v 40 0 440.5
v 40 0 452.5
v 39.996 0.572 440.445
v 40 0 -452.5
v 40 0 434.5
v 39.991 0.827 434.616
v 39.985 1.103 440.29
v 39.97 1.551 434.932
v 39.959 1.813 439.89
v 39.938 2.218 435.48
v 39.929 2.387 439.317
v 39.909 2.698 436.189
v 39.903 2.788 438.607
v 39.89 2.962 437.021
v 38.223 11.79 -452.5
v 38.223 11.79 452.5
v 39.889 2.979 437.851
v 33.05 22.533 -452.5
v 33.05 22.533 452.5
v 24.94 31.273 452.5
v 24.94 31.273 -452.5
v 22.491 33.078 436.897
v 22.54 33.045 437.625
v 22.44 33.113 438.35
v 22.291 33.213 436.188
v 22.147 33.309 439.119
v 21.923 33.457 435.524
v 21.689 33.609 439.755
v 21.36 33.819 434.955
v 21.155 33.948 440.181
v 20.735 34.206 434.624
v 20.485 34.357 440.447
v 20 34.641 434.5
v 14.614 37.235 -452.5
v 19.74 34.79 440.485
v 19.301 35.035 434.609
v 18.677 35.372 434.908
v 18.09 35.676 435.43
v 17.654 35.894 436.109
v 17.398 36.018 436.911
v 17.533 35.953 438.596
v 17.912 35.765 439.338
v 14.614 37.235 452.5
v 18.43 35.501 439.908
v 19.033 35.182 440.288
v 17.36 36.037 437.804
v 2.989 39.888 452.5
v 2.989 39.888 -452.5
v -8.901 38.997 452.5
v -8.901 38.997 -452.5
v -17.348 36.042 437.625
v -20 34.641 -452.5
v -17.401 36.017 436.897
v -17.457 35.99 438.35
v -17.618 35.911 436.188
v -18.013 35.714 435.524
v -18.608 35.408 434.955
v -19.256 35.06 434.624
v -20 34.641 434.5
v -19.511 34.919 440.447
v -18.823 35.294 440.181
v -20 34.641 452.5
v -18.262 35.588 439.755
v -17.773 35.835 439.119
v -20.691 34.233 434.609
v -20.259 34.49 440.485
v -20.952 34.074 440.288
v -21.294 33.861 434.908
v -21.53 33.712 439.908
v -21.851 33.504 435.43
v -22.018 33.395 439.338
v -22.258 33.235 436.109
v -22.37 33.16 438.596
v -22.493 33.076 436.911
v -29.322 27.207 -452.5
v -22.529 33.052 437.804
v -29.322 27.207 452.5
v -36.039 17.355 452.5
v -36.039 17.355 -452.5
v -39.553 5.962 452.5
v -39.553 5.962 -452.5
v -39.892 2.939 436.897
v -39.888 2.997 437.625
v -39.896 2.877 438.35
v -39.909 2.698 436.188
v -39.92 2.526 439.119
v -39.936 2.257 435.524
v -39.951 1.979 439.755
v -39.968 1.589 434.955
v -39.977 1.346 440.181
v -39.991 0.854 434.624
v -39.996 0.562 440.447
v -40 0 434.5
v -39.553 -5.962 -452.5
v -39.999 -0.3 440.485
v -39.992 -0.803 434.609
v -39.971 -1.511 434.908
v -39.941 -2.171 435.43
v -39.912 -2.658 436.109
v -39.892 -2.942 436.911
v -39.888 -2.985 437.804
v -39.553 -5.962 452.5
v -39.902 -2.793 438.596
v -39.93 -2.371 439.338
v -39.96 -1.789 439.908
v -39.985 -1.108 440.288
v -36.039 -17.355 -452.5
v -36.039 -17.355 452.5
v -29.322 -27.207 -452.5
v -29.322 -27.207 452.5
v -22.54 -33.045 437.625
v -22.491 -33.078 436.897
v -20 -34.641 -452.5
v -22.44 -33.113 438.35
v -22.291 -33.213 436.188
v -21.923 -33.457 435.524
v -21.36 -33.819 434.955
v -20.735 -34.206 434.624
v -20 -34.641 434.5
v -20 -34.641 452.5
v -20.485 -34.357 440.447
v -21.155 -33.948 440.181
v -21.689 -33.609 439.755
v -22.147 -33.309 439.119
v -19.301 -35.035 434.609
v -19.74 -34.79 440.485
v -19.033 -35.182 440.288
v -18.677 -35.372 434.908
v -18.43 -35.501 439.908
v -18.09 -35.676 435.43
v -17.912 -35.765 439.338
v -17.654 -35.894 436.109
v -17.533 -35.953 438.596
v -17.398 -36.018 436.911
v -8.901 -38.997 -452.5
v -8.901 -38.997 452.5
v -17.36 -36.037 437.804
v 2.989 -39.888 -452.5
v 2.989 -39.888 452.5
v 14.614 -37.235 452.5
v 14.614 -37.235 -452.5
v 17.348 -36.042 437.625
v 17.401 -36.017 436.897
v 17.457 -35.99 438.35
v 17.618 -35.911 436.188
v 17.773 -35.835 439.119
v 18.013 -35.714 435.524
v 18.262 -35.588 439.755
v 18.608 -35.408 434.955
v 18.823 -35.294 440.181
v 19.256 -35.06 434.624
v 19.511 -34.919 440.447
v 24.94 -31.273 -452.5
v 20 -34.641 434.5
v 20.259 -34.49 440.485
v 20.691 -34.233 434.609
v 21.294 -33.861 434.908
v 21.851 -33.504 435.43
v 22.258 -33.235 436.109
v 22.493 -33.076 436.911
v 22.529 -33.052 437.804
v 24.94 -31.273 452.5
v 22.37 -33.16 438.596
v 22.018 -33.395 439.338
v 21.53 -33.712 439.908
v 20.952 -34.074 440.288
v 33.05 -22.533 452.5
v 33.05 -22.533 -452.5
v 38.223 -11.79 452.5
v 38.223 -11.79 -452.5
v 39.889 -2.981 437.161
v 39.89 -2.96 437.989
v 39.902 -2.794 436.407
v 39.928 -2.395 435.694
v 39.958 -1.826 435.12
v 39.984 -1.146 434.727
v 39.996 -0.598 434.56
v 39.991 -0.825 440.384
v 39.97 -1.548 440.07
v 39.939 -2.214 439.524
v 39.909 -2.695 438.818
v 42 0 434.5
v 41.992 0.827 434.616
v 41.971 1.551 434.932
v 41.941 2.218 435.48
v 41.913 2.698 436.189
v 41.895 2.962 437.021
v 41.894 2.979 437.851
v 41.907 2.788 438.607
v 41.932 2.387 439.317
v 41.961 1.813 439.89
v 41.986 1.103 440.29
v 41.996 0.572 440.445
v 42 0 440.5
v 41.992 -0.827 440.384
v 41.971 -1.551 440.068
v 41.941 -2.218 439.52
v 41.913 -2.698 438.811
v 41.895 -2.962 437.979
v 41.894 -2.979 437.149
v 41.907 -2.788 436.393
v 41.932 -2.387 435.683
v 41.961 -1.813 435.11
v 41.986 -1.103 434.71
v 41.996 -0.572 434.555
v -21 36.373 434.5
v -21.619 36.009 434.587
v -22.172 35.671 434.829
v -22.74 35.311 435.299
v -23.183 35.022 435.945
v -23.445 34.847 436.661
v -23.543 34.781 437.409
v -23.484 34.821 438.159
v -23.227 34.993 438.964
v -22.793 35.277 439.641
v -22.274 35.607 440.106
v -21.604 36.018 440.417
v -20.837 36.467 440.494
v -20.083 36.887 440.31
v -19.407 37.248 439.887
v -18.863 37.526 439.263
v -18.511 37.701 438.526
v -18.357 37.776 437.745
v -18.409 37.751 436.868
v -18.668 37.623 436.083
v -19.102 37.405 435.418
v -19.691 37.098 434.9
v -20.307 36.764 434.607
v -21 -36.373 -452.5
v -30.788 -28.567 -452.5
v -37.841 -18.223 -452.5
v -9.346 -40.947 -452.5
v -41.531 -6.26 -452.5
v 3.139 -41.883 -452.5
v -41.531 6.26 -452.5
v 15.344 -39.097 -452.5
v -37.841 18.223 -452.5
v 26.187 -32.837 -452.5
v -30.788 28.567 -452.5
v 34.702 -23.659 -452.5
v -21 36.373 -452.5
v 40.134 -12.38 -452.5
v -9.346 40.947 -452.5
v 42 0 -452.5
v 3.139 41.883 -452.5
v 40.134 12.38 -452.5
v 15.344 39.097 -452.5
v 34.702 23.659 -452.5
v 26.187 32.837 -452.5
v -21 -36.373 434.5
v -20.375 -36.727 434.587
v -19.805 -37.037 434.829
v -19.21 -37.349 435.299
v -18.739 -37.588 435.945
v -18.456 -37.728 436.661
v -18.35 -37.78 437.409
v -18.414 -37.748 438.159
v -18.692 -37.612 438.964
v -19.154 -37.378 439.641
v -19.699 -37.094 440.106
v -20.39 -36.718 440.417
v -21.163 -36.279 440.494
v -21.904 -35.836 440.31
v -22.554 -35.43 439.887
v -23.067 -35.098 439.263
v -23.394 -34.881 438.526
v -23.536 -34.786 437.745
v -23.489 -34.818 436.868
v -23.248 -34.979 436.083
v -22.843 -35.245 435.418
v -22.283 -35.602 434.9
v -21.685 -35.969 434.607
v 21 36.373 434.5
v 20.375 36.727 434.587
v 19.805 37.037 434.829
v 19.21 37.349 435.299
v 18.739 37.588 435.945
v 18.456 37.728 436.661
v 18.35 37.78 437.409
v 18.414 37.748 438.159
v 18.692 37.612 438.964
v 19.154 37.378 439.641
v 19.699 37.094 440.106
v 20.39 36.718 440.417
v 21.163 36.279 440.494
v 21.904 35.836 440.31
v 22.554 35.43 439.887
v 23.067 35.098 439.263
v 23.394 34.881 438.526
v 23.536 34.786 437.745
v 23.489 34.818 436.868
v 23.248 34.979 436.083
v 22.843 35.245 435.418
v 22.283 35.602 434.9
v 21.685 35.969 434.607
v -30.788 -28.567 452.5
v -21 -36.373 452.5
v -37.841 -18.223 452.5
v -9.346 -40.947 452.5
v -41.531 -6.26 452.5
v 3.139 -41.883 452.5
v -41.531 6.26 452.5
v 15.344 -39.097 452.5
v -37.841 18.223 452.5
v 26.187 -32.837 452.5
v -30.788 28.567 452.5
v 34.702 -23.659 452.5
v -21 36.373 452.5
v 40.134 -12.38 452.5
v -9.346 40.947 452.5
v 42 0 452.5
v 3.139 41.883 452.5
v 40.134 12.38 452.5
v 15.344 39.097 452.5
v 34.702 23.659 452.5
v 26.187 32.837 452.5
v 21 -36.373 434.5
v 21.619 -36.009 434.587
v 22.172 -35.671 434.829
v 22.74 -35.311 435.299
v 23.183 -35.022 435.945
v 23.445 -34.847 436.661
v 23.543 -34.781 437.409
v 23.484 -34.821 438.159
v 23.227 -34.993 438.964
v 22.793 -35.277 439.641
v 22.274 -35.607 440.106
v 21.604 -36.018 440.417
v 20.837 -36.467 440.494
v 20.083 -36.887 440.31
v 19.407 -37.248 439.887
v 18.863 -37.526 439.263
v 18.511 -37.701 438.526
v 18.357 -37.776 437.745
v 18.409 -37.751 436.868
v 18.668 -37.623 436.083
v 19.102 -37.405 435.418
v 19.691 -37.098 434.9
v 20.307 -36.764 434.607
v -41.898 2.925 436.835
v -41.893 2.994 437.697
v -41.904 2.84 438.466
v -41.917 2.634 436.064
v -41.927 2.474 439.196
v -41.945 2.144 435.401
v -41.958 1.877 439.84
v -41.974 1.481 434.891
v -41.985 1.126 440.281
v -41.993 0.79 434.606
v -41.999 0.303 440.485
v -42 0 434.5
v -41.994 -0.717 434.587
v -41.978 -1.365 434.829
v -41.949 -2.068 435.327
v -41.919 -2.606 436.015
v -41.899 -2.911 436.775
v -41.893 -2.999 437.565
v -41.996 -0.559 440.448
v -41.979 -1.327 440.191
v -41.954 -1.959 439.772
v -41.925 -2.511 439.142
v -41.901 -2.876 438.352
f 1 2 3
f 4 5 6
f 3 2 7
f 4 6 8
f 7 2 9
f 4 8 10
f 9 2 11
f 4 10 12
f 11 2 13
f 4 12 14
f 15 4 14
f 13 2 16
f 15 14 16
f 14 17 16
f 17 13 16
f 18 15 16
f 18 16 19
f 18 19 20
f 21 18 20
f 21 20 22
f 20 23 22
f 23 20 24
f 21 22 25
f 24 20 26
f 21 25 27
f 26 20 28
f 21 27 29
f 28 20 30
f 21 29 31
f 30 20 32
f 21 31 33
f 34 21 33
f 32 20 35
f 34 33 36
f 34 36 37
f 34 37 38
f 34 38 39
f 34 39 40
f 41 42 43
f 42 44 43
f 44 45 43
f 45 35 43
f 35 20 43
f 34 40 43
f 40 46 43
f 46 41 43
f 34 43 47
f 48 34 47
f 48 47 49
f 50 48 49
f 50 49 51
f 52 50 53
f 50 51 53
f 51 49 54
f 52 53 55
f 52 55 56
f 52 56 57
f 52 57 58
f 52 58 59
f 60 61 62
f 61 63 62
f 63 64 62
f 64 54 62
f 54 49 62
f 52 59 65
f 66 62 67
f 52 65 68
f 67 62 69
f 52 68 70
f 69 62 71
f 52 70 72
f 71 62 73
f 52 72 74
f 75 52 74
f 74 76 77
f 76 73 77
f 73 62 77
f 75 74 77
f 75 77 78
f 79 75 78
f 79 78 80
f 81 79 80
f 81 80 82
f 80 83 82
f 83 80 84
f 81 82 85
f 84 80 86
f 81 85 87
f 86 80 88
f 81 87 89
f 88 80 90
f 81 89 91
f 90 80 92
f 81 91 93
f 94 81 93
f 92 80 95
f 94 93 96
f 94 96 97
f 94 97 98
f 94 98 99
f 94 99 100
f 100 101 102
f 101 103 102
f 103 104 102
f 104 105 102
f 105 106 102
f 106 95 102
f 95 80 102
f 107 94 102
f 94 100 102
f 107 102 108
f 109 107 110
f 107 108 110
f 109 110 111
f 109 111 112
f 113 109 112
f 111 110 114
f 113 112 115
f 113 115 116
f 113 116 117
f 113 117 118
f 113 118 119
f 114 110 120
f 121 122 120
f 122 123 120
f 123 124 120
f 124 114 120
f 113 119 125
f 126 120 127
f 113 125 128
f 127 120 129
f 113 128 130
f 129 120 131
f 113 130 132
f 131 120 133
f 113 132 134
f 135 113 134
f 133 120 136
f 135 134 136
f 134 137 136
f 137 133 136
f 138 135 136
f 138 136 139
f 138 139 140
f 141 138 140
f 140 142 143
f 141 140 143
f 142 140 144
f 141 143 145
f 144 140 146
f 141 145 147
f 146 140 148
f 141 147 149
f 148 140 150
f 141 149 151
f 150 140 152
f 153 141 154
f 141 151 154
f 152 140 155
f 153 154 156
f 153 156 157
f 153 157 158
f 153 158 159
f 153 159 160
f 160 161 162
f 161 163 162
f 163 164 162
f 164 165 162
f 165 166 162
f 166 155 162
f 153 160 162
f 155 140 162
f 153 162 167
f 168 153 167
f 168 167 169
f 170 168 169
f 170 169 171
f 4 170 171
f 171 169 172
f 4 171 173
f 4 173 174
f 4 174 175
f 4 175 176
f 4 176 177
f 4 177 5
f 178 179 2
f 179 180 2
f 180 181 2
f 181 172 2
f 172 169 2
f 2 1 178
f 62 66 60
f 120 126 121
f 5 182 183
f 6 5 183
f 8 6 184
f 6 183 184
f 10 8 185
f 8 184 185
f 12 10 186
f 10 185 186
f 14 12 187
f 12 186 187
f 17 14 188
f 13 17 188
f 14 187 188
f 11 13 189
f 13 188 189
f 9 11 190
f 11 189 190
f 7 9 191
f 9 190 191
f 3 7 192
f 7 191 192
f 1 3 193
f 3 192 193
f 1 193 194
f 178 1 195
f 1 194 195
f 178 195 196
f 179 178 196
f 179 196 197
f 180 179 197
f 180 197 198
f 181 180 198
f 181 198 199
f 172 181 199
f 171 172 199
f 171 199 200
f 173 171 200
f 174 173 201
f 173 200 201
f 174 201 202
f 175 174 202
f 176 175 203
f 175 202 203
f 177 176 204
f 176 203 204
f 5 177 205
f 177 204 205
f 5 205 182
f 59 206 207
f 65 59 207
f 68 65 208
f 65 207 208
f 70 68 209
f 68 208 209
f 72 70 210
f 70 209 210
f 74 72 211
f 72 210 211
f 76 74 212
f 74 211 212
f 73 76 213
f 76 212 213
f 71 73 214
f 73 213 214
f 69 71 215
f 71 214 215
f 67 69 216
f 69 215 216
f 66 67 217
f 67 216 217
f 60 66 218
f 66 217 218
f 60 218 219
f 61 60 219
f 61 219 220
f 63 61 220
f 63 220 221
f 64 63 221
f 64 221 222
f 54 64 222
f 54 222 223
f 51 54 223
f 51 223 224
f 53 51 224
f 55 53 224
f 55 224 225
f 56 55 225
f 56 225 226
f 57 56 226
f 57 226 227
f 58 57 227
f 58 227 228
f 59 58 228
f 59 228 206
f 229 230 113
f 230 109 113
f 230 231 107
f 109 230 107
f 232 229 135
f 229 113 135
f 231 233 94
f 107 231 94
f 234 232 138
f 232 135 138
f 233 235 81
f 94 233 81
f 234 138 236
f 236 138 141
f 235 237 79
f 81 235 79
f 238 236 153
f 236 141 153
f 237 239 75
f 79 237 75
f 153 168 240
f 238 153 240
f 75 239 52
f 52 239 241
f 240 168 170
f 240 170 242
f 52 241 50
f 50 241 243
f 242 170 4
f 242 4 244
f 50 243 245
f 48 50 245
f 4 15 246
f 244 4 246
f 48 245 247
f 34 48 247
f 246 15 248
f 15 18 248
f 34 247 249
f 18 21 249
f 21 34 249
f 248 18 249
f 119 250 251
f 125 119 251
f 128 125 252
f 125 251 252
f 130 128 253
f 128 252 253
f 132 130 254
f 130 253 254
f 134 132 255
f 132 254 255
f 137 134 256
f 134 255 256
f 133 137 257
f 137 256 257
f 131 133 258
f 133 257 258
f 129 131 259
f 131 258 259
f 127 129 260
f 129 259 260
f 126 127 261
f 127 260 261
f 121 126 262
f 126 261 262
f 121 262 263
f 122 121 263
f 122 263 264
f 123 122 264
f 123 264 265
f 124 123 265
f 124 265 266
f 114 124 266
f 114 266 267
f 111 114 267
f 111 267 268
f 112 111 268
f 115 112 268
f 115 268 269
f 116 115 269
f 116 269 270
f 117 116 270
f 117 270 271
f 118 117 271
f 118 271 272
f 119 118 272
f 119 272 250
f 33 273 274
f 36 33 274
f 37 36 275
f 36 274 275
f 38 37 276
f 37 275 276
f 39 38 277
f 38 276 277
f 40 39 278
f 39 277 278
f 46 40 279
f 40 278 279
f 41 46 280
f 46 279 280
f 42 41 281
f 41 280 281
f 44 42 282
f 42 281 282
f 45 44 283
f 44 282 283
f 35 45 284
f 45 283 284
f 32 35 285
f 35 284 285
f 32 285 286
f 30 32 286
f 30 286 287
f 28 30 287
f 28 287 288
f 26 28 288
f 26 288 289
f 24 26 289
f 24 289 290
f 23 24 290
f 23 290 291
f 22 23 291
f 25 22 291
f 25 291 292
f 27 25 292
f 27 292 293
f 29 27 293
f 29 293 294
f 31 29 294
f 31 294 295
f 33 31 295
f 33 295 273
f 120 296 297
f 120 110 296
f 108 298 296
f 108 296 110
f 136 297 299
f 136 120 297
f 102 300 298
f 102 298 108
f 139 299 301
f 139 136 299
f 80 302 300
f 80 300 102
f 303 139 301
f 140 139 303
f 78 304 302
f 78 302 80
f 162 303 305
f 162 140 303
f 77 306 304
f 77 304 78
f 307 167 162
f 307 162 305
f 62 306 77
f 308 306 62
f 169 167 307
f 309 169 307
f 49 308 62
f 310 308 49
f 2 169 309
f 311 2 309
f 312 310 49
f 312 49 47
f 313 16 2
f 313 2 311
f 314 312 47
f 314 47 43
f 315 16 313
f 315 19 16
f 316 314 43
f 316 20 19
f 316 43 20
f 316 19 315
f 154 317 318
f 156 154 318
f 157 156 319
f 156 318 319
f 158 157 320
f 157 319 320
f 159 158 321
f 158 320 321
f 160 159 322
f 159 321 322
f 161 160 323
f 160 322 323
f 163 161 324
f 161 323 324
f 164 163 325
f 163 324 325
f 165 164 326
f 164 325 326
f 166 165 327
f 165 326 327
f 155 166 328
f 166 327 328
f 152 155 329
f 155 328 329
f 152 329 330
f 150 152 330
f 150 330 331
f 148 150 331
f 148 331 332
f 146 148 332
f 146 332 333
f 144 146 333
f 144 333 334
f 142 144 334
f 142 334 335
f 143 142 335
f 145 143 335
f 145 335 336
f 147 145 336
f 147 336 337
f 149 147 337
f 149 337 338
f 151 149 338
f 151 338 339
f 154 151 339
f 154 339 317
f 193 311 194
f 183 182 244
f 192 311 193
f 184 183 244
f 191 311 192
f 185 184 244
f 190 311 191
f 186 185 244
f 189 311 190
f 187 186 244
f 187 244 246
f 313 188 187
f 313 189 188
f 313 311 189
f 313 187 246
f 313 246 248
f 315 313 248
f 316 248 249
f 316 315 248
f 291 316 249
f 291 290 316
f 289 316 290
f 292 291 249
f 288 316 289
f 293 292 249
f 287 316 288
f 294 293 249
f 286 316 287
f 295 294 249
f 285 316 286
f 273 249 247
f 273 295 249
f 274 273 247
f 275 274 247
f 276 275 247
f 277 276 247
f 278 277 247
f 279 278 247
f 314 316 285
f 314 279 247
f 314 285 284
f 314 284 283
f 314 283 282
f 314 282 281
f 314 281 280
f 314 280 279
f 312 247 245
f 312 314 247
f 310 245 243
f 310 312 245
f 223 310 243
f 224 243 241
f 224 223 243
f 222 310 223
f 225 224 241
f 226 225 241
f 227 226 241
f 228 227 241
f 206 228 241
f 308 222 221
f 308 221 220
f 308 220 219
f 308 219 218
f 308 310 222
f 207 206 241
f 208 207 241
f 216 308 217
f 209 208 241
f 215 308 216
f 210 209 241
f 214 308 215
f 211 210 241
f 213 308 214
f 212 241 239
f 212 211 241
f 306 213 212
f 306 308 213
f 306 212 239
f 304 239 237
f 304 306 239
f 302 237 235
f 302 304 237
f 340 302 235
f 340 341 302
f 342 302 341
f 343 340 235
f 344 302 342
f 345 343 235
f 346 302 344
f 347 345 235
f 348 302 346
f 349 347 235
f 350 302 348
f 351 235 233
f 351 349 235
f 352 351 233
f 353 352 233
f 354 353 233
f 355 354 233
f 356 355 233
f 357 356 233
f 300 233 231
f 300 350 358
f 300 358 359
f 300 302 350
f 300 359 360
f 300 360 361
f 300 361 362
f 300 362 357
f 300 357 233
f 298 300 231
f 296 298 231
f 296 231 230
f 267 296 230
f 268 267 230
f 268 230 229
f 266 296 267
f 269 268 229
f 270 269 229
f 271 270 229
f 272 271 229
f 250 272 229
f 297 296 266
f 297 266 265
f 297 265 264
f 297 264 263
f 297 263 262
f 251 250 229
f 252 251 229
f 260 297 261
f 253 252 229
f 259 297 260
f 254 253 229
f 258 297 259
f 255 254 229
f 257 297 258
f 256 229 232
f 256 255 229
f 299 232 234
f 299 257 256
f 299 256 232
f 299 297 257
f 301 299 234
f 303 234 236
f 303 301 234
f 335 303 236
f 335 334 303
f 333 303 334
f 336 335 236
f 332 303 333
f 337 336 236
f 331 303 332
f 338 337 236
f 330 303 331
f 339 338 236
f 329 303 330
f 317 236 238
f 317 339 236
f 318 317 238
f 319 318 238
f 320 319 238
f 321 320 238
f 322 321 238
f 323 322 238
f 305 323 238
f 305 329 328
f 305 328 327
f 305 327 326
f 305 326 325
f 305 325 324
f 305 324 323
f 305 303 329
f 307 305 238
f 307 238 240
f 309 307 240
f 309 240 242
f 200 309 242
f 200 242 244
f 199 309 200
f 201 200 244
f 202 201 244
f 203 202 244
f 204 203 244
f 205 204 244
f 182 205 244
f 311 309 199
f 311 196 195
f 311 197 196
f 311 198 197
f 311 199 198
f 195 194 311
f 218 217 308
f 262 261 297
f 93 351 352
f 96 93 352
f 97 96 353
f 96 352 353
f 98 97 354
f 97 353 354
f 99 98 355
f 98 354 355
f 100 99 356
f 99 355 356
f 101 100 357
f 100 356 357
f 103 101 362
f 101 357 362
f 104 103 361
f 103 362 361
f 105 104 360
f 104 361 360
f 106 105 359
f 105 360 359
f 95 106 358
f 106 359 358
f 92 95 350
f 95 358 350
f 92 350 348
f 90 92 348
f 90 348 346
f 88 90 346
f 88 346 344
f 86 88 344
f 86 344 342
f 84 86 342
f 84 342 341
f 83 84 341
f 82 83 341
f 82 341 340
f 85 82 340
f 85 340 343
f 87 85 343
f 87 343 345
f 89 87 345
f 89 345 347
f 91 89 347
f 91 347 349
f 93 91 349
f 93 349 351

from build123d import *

# Parameters (mm, degrees)
SKETCH3_R               = 42
SKETCH3_R_2             = 40
BOSS_EXTRUDE1_DEPTH     = 905
CUT_EXTRUDE1_REACH      = 464.143
CUT_EXTRUDE1_END_RADIUS = 40
SKETCH4_R               = 3
CIRPATTERN1_COUNT       = 6


with BuildPart() as part:
    # Sketch3 → Boss-Extrude1 (new body)
    with BuildSketch(Plane.XY.offset(452.5)):
        Circle(SKETCH3_R)
        Circle(SKETCH3_R_2, mode=Mode.SUBTRACT)
    extrude(amount=-BOSS_EXTRUDE1_DEPTH)

    # Cut-Extrude1: up to this cylinder (the profile starts outside it)
    cut_extrude1_end = Plane(origin=(0, 0, 437.5), z_dir=(0, 0, 1)) * Cylinder(CUT_EXTRUDE1_END_RADIUS, 1009.286, mode=Mode.PRIVATE)
    # Sketch4 → Cut-Extrude1 (cut, up to the surface)
    with BuildSketch(Plane(origin=(42, 0, 0), x_dir=(0, 0, -1), z_dir=(1, 0, 0)), mode=Mode.PRIVATE) as cut_extrude1_sk1:
        with Locations((-437.5, 0)):
            Circle(SKETCH4_R)
    cut_extrude1_tool1 = extrude(cut_extrude1_sk1.sketch, amount=-CUT_EXTRUDE1_REACH, mode=Mode.PRIVATE) - cut_extrude1_end
    cut_extrude1 = cut_extrude1_tool1.solids().sort_by_distance((42, 0, 437.5))[0]
    add(cut_extrude1, mode=Mode.SUBTRACT)

    # CirPattern1: Cut-Extrude1 ×6 about axis
    cirpattern1_axis = Axis((0, 0, 452.5), (0, 0, 1))
    for i in range(1, CIRPATTERN1_COUNT):
        add(cut_extrude1.rotate(cirpattern1_axis, i * 360 / CIRPATTERN1_COUNT), mode=Mode.SUBTRACT)


solid = part.part
